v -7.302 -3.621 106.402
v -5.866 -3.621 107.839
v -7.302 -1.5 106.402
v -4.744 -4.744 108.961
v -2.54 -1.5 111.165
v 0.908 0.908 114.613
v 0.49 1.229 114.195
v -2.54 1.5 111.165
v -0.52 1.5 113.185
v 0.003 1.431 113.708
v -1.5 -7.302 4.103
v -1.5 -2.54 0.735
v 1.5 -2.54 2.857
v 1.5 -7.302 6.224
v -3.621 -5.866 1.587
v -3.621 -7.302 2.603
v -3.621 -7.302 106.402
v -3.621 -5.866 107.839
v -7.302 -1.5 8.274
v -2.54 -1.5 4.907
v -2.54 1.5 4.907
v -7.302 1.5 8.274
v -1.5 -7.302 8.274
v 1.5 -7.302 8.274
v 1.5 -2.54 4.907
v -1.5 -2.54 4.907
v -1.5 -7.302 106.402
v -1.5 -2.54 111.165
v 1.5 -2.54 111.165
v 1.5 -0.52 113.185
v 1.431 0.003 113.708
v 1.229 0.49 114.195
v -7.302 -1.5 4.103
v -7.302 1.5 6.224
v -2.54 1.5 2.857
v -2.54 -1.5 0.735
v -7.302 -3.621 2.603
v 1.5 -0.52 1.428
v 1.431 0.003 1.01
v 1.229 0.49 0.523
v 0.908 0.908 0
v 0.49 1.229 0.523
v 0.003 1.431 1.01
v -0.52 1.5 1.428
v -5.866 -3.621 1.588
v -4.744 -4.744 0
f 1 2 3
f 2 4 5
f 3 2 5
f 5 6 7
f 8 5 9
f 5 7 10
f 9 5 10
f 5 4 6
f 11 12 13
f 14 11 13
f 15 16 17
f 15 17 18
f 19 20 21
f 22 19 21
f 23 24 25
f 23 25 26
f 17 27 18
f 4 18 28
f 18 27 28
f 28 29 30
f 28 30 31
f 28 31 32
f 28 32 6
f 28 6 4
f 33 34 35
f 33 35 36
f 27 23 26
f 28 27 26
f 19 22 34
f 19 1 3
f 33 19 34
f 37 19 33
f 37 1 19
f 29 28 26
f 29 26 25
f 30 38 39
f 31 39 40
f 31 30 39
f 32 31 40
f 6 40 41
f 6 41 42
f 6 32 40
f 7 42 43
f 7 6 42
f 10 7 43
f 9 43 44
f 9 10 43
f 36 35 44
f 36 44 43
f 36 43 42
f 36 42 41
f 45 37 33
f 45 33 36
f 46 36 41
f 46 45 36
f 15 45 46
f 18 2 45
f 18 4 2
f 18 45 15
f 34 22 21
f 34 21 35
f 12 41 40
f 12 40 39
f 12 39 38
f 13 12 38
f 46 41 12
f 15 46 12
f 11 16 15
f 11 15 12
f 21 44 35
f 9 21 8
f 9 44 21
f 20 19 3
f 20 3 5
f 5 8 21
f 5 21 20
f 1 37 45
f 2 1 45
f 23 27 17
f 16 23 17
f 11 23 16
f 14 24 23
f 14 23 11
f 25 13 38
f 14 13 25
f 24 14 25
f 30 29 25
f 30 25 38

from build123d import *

# Parameters (mm, degrees)
SKETCH7_W               = 4.7625
SKETCH7_H               = 2.12122512
BOSS_EXTRUDE2_DEPTH     = 130.175
SKETCH8_W               = 2.12122512
SKETCH8_H               = 4.7625
BOSS_EXTRUDE3_DEPTH     = 130.175
BOSS_EXTRUDE4_DEPTH     = 130.175
CUT_EXTRUDE6_DEPTH      = 245.098438966
CUT_EXTRUDE6_DEPTH_BACK = 245.098438966
CUT_EXTRUDE7_DEPTH      = 219.920809905
CUT_EXTRUDE7_DEPTH_BACK = 219.920809905


with BuildPart() as part:
    # Sketch7 → Boss-Extrude2 (new, symmetric)
    with BuildSketch(Plane.XY):
        with Locations((-4.92125, -2.560612608)):
            Rectangle(SKETCH7_W, SKETCH7_H)
    extrude(amount=BOSS_EXTRUDE2_DEPTH, both=True)

    # Sketch8 → Boss-Extrude3 (add, symmetric)
    with BuildSketch(Plane.XY):
        with Locations((-2.560612608, -4.92125)):
            Rectangle(SKETCH8_W, SKETCH8_H)
    extrude(amount=BOSS_EXTRUDE3_DEPTH, both=True)

    # Sketch11 → Boss-Extrude4 (add, symmetric)
    with BuildSketch(Plane.XY):
        with BuildLine():
            Line((-2.54, 1.500000048), (-2.54, -1.500000048))
            Line((-2.54, -1.500000048), (-7.3025, -1.500000048))
            Line((-7.3025, -1.500000048), (-7.3025, -3.621225168))
            Line((-7.3025, -3.621225168), (-5.866289198, -3.621225168))
            Line((-5.866289198, -3.621225168), (-3.621225168, -5.866289198))
            Line((-3.621225168, -5.866289198), (-3.621225168, -7.3025))
            Line((-3.621225168, -7.3025), (-1.500000048, -7.3025))
            Line((-1.500000048, -7.3025), (-1.500000048, -2.54))
            Line((-1.500000048, -2.54), (1.500000048, -2.54))
            Line((1.500000048, -2.54), (1.500000048, -0.519999976))
            ThreePointArc((1.500000048, -0.519999976), (0.908355739, 0.908355739), (-0.519999976, 1.500000048))
            Line((-0.519999976, 1.500000048), (-2.54, 1.500000048))
        make_face()
    extrude(amount=BOSS_EXTRUDE4_DEPTH, both=True)

    # Sketch18 → Cut-Extrude6 (cut, two sides: drawn at the far end of the back side and taken through both)
    with BuildSketch(Plane(origin=(0, 0, 113.704878), x_dir=(-0.7071067811865466, 0.7071067811865485, 0), z_dir=(-0.5773502691896266, -0.577350269189625, -0.577350269189626)).offset(-CUT_EXTRUDE6_DEPTH_BACK)):
        Polygon((0, 0), (63.5, 36.661742094), (0, -73.323484187), (-63.5, 36.661742094), align=None)
    extrude(amount=CUT_EXTRUDE6_DEPTH + CUT_EXTRUDE6_DEPTH_BACK, mode=Mode.SUBTRACT)

    # Sketch19 → Cut-Extrude7 (cut, two sides: drawn at the far end of the back side and taken through both)
    with BuildSketch(Plane(origin=(-66.606775424, -160.802980576, 0), x_dir=(0.7071067811865466, -0.7071067811865485, 0), z_dir=(0.7071067811865485, 0.7071067811865466, 0)).offset(-CUT_EXTRUDE7_DEPTH_BACK)):
        Polygon((-66.606775424, 0), (187.393224576, -254), (187.393224576, 254), (-320.606775424, 254), (-320.606775424, -254), align=None)
    extrude(amount=CUT_EXTRUDE7_DEPTH + CUT_EXTRUDE7_DEPTH_BACK, mode=Mode.SUBTRACT)

    # Sweep1: sweep along a curve in space
    with BuildLine() as sweep1_path:
        Line((-7.3025, -1.500000048, 4.102987064), (-2.54, -1.500000048, 0.735391018))
    # Sketch20 → Sweep1 (sweep)
    with BuildSketch(Plane.ZY.offset(2.54)):
        Polygon((4.906903198, 1.5), (4.906903198, -1.500000048), (0.735391018, -1.500000048), (2.85671143, 1.500000048), align=None)
    sweep(path=sweep1_path.line)

    # Sweep2: sweep along a curve in space
    with BuildLine() as sweep2_path:
        Line((-1.500000048, -2.54, 0.735391018), (-1.500000048, -7.3025, 4.102987064))
    # Sketch21 → Sweep2 (sweep)
    with BuildSketch(Plane.XZ.offset(2.54)):
        Polygon((-1.500000048, 4.906903198), (1.500000048, 4.906903198), (1.500000048, 2.85671143), (-1.500000048, 0.735391018), align=None)
    sweep(path=sweep2_path.line)


solid = part.part
